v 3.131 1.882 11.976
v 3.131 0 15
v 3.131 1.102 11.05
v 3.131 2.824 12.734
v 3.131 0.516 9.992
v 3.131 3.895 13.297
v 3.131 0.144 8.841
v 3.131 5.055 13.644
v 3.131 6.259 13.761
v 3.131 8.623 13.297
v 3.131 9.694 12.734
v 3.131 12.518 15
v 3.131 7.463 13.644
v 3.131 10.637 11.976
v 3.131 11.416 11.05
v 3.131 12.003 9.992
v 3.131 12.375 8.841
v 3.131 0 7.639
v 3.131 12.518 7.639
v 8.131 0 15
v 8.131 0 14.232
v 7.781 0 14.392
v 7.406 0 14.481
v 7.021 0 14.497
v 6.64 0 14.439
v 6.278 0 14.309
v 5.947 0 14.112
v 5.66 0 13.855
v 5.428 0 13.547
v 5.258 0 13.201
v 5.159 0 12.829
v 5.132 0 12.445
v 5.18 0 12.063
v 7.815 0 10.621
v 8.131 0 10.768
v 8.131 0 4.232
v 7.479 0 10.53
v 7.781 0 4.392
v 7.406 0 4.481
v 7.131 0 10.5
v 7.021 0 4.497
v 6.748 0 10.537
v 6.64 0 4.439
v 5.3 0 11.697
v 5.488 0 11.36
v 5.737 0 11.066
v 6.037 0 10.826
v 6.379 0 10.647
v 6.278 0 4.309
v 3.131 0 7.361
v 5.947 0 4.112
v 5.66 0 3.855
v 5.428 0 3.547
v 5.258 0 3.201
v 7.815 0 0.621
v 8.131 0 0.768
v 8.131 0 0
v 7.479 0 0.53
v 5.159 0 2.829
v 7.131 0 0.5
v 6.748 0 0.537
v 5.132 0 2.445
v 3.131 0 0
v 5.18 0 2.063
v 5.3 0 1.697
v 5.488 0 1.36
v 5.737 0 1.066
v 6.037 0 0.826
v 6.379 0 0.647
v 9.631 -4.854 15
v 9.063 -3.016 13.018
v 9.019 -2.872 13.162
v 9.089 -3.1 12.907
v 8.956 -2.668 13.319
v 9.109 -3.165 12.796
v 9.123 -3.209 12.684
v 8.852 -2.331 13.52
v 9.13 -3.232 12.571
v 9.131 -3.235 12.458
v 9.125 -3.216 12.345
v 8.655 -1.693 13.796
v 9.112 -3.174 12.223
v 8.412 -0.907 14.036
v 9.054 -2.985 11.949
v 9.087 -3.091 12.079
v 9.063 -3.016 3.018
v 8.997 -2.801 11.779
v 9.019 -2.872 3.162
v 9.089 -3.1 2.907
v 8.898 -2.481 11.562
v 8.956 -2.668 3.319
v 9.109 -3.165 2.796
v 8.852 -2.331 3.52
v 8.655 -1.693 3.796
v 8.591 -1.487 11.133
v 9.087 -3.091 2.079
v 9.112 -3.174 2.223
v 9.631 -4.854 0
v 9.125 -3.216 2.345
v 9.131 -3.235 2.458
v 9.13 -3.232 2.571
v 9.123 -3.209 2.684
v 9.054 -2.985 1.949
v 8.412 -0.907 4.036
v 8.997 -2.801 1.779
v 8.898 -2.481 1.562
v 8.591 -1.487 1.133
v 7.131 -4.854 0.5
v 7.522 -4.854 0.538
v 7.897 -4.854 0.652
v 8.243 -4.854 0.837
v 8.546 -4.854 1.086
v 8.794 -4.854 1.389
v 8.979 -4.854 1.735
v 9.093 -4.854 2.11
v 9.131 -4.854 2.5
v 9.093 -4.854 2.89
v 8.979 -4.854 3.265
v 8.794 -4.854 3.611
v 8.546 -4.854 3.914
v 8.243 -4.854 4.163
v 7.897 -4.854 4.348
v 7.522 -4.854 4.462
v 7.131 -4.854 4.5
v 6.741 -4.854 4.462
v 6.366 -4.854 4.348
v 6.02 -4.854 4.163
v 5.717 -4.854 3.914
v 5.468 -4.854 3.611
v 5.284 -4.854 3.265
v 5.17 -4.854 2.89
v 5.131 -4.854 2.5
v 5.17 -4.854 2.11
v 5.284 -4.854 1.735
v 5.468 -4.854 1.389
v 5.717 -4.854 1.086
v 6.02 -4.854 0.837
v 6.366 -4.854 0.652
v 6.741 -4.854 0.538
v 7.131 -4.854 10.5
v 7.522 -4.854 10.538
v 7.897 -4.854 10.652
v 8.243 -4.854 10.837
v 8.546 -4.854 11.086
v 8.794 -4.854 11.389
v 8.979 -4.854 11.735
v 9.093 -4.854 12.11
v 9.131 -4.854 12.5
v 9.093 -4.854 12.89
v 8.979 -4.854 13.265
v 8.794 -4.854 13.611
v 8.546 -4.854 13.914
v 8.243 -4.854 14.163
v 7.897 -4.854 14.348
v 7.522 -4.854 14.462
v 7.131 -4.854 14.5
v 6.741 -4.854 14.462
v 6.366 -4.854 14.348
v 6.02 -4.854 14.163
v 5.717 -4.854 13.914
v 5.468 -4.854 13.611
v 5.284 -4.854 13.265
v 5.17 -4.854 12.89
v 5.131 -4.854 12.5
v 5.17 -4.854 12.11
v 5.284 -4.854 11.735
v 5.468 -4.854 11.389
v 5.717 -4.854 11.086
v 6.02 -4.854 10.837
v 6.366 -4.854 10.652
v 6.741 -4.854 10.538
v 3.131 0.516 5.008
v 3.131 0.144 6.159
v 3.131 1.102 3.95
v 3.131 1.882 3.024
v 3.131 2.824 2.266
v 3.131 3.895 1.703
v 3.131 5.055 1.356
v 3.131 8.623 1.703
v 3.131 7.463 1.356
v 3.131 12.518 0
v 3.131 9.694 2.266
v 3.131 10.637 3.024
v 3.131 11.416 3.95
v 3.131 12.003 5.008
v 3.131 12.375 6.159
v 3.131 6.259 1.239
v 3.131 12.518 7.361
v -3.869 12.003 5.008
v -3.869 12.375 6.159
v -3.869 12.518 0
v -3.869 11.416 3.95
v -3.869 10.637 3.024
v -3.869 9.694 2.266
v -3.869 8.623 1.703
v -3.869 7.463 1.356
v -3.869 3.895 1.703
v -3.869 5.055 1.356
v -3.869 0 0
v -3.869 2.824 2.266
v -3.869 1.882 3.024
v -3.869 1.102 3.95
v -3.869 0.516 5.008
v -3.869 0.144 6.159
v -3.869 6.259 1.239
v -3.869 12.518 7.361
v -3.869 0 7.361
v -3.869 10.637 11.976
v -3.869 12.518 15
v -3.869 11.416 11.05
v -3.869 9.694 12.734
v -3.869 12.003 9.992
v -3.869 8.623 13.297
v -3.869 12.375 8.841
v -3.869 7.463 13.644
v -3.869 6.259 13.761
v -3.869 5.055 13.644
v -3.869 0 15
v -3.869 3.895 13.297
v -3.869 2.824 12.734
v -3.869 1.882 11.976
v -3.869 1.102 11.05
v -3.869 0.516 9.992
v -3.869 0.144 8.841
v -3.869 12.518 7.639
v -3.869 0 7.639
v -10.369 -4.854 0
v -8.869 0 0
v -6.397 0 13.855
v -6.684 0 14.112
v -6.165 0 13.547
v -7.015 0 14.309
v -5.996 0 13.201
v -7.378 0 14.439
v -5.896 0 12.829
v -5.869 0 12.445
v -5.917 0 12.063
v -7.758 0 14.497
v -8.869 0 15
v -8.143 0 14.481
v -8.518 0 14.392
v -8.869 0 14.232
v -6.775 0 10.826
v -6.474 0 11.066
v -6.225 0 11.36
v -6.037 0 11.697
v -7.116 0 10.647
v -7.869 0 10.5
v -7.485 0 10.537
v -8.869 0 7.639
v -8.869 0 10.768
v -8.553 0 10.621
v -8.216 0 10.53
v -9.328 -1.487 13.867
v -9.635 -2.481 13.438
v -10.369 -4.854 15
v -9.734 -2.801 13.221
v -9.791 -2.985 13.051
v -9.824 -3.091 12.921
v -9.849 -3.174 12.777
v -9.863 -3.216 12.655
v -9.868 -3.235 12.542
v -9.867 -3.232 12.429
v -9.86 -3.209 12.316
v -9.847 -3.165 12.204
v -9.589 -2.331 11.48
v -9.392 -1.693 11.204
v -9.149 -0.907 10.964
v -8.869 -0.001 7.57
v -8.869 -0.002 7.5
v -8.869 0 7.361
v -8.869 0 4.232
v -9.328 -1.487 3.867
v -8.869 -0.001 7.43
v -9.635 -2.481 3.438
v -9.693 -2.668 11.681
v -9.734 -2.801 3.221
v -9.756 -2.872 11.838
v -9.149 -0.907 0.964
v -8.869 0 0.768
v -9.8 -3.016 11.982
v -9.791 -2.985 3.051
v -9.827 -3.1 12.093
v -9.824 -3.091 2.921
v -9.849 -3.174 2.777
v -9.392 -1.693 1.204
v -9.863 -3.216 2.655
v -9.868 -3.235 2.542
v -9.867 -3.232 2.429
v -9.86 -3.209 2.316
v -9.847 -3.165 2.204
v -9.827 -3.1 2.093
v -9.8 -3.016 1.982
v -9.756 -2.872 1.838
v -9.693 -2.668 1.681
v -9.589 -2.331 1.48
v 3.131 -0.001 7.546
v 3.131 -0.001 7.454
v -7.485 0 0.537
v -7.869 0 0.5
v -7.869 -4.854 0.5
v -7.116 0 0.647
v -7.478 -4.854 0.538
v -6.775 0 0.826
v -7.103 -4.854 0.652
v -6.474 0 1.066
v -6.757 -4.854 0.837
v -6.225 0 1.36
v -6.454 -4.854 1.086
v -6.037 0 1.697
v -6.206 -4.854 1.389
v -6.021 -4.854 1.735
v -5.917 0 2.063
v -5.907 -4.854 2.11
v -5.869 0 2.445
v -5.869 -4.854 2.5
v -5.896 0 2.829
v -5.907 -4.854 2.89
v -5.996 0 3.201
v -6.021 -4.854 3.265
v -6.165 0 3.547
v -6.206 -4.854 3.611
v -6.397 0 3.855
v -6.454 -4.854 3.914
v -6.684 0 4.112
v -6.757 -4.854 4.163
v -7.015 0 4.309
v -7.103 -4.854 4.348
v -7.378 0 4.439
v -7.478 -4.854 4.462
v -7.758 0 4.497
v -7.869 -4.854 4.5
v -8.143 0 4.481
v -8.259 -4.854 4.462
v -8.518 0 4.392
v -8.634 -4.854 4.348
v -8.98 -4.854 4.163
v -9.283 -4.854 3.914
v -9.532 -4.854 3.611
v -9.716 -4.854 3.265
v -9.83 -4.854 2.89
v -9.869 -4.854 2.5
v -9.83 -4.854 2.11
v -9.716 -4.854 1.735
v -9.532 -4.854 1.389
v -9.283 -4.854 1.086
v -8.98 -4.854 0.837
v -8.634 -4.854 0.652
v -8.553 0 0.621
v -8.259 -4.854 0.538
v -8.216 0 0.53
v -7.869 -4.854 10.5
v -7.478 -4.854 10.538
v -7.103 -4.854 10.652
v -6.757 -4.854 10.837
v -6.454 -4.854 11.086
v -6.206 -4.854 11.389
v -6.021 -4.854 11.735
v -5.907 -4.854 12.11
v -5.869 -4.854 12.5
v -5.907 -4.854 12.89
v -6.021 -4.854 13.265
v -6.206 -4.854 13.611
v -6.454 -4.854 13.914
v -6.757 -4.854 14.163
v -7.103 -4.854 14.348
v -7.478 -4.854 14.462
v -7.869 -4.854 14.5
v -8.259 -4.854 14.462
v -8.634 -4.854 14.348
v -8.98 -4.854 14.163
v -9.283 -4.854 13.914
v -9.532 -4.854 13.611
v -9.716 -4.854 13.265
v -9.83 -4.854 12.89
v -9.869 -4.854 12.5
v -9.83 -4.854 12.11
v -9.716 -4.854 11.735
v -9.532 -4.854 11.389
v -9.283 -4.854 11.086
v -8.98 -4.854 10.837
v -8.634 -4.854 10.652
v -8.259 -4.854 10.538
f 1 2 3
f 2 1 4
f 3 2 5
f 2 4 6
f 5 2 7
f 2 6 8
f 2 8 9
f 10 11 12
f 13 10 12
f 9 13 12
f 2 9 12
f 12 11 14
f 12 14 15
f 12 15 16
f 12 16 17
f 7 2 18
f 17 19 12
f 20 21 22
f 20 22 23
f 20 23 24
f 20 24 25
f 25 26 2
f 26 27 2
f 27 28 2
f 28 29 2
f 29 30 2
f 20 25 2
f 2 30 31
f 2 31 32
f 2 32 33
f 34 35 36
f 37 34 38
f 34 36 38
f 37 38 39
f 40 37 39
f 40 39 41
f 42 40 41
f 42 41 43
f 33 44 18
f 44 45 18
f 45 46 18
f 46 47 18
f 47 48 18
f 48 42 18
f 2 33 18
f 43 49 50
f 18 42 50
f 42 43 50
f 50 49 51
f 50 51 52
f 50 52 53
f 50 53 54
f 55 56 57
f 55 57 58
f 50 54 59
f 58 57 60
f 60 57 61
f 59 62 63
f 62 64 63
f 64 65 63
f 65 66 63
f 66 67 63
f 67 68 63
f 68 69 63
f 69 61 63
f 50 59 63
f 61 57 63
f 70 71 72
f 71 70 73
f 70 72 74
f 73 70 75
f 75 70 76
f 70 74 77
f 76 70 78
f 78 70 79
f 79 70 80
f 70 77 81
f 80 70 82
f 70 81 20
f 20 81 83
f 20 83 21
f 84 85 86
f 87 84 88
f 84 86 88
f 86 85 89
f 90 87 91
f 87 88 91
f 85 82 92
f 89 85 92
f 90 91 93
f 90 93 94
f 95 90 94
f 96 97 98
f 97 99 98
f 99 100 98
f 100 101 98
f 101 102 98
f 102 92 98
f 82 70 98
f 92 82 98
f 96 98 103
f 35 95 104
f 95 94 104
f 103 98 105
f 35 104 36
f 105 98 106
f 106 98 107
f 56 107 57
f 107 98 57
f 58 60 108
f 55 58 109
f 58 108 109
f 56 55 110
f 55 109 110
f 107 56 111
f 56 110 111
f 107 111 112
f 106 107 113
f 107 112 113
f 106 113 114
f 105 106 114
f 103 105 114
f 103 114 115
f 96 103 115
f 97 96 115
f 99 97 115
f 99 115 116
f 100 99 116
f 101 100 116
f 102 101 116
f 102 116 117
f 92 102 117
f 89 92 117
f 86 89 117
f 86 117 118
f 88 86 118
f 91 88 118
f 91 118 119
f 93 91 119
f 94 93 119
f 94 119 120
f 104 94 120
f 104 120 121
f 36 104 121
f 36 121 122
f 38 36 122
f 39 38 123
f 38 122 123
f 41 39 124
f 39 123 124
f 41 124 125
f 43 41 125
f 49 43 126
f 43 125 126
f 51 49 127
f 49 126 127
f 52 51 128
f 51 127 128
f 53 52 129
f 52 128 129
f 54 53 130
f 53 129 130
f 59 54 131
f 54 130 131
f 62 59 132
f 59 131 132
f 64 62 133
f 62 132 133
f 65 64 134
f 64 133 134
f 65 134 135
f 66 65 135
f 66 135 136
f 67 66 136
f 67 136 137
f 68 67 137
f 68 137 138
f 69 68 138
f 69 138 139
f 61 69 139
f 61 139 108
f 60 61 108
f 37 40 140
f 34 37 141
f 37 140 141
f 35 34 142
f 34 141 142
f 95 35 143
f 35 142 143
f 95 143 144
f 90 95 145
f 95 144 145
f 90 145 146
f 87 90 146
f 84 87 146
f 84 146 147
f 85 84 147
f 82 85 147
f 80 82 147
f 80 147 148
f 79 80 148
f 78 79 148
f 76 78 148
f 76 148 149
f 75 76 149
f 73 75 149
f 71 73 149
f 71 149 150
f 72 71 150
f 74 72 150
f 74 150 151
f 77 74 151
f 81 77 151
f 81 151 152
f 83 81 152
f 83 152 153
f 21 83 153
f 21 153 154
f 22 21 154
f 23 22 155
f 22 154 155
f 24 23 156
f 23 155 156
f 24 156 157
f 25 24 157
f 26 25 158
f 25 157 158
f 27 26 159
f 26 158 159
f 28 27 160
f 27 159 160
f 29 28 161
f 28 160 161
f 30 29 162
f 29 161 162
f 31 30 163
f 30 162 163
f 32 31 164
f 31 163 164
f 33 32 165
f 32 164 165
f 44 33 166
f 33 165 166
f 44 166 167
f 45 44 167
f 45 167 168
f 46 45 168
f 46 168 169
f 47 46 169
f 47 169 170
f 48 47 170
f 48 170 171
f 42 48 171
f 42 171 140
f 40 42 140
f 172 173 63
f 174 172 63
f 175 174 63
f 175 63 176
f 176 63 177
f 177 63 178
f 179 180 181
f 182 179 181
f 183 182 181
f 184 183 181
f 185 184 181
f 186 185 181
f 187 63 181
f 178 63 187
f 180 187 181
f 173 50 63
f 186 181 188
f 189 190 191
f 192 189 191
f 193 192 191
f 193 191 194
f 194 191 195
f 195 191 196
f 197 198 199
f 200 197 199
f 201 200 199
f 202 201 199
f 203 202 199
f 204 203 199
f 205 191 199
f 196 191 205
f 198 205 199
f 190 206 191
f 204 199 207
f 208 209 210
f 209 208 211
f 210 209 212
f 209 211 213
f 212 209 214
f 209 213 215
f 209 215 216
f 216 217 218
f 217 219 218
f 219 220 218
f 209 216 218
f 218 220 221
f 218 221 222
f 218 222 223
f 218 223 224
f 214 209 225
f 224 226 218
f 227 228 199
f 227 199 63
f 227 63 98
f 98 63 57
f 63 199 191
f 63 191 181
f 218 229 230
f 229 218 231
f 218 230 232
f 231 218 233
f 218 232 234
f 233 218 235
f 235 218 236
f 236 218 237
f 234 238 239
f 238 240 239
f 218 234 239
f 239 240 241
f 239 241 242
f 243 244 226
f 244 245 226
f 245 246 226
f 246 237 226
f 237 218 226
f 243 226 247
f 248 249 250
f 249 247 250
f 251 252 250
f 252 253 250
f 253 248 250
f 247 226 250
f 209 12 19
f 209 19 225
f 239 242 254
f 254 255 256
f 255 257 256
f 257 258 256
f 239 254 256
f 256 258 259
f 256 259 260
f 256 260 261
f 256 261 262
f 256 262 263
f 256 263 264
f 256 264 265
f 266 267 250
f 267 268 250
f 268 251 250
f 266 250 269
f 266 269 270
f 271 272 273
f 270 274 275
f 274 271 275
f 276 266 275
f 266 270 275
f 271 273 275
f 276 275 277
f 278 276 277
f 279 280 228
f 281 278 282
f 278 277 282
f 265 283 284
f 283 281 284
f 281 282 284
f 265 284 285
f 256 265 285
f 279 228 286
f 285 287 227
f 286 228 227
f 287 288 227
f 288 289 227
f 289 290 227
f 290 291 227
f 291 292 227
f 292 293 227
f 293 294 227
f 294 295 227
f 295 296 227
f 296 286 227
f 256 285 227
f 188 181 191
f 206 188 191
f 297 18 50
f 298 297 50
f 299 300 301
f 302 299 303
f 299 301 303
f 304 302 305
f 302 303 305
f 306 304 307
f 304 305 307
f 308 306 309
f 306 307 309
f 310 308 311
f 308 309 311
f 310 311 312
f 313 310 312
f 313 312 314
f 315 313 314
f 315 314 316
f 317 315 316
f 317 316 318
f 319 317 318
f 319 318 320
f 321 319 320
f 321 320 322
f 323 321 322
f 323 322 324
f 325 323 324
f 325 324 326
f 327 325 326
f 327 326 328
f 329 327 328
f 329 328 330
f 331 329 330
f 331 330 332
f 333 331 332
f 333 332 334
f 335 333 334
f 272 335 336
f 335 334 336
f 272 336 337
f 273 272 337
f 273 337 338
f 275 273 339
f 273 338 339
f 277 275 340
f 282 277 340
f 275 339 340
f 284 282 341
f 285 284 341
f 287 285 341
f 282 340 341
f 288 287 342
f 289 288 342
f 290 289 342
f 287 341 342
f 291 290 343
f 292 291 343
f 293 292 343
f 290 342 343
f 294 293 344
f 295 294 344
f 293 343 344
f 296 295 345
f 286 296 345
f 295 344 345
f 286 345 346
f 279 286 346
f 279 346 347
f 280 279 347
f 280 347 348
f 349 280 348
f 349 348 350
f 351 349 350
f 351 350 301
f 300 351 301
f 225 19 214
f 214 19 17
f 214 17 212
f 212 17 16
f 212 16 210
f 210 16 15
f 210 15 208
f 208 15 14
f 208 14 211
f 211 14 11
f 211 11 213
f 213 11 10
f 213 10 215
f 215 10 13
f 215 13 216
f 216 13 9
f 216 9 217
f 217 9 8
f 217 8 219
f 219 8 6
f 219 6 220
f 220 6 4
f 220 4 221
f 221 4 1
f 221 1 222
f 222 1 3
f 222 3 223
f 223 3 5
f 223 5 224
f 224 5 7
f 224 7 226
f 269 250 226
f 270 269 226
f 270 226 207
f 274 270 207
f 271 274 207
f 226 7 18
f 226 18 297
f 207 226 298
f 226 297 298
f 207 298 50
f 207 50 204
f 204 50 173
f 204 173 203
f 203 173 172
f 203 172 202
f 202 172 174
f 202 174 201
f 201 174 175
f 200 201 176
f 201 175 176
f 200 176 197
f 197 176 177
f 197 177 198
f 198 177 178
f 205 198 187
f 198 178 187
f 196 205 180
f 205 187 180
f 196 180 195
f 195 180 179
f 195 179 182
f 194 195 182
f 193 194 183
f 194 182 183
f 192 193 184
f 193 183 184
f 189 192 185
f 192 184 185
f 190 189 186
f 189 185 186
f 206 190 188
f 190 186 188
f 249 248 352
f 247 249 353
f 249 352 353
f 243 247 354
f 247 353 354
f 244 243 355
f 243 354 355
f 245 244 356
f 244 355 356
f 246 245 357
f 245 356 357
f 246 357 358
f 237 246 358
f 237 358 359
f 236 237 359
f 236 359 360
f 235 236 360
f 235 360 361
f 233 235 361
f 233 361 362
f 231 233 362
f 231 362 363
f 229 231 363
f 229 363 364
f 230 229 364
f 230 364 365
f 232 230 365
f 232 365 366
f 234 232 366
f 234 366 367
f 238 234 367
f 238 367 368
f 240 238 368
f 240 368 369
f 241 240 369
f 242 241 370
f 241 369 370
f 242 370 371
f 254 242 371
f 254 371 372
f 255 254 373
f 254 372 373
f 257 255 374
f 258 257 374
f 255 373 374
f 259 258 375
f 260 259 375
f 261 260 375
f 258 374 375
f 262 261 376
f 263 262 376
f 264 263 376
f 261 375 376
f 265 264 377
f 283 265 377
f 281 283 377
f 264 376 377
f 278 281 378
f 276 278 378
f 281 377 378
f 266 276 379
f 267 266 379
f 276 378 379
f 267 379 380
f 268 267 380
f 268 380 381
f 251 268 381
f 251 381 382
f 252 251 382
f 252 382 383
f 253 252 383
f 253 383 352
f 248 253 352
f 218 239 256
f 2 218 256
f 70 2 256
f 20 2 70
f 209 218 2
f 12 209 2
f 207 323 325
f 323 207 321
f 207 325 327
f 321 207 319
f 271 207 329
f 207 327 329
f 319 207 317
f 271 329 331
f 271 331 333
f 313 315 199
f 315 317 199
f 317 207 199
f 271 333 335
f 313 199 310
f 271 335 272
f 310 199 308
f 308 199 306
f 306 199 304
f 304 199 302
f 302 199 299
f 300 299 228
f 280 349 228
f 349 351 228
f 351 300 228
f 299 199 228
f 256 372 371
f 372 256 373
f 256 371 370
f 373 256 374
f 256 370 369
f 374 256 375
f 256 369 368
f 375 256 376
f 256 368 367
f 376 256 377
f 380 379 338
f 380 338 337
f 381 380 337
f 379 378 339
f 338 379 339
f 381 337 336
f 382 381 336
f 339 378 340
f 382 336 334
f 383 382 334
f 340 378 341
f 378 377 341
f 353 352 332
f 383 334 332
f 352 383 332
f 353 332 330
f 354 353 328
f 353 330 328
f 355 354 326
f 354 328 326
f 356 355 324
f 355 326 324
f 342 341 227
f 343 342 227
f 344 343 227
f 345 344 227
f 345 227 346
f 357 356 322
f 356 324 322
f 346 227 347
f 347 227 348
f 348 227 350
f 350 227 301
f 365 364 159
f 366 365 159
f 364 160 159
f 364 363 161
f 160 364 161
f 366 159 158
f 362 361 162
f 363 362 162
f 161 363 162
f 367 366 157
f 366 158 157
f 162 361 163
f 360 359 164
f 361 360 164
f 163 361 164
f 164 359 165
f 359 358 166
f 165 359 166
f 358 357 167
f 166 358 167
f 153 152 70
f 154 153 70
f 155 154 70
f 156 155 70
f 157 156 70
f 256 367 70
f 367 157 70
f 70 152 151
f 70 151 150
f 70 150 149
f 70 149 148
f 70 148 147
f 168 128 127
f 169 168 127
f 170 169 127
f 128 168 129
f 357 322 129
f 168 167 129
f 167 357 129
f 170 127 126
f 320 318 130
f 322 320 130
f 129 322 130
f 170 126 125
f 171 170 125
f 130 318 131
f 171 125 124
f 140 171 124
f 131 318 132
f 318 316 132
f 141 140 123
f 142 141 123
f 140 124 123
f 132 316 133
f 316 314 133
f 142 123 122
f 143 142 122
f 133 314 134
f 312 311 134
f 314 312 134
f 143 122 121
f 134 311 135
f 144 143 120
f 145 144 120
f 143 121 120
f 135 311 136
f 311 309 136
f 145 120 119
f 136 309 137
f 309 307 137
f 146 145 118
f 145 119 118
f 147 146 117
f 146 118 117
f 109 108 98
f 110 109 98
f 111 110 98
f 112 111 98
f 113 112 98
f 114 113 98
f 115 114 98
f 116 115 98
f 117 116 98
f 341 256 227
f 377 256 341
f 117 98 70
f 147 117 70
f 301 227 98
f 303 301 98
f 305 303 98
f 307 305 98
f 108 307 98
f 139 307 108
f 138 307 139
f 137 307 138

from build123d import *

# Parameters (mm, degrees)
EXTRUDE_1_DEPTH     = 15
SKETCH_2_R          = 6.260668565
CUT_EXTRUDE_1_DEPTH = 20
SKETCH_3_R          = 2
CUT_EXTRUDE_2_DEPTH = 20


with BuildPart() as part:
    # 草图1 → 凸台-拉伸1 (new body)
    with BuildSketch(Plane.XY):
        Polygon((-10.368613139, -4.854014599), (9.631386861, -4.854014599), (8.131386861, 0), (3.131386861, 0), (3.131386861, 12.518248175), (-3.868613139, 12.518248175), (-3.868613139, 0), (-8.868613139, 0), align=None)
    extrude(amount=EXTRUDE_1_DEPTH)

    # 草图2 → 切除-拉伸1 (cut)
    with BuildSketch(Plane(origin=(3.131386861, 0, 0), x_dir=(0, 0, -1), z_dir=(1, 0, 0))):
        with Locations((-7.5, 6.259124088)):
            Circle(SKETCH_2_R)
    extrude(amount=-CUT_EXTRUDE_1_DEPTH, mode=Mode.SUBTRACT)

    # 草图3 → 切除-拉伸2 (cut)
    with BuildSketch(Plane.XZ.offset(4.854014599)):
        with Locations(Location((-7.868613139, 12.5, 0), (0, 0, 270))):
            Circle(SKETCH_3_R)
        with Locations(Location((7.131386861, 12.5, 0), (0, 0, 270))):
            Circle(SKETCH_3_R)
        with Locations(Location((7.131386861, 2.5, 0), (0, 0, 270))):
            Circle(SKETCH_3_R)
        with Locations(Location((-7.868613139, 2.5, 0), (0, 0, 270))):
            Circle(SKETCH_3_R)
    extrude(amount=-CUT_EXTRUDE_2_DEPTH, mode=Mode.SUBTRACT)


solid = part.part
